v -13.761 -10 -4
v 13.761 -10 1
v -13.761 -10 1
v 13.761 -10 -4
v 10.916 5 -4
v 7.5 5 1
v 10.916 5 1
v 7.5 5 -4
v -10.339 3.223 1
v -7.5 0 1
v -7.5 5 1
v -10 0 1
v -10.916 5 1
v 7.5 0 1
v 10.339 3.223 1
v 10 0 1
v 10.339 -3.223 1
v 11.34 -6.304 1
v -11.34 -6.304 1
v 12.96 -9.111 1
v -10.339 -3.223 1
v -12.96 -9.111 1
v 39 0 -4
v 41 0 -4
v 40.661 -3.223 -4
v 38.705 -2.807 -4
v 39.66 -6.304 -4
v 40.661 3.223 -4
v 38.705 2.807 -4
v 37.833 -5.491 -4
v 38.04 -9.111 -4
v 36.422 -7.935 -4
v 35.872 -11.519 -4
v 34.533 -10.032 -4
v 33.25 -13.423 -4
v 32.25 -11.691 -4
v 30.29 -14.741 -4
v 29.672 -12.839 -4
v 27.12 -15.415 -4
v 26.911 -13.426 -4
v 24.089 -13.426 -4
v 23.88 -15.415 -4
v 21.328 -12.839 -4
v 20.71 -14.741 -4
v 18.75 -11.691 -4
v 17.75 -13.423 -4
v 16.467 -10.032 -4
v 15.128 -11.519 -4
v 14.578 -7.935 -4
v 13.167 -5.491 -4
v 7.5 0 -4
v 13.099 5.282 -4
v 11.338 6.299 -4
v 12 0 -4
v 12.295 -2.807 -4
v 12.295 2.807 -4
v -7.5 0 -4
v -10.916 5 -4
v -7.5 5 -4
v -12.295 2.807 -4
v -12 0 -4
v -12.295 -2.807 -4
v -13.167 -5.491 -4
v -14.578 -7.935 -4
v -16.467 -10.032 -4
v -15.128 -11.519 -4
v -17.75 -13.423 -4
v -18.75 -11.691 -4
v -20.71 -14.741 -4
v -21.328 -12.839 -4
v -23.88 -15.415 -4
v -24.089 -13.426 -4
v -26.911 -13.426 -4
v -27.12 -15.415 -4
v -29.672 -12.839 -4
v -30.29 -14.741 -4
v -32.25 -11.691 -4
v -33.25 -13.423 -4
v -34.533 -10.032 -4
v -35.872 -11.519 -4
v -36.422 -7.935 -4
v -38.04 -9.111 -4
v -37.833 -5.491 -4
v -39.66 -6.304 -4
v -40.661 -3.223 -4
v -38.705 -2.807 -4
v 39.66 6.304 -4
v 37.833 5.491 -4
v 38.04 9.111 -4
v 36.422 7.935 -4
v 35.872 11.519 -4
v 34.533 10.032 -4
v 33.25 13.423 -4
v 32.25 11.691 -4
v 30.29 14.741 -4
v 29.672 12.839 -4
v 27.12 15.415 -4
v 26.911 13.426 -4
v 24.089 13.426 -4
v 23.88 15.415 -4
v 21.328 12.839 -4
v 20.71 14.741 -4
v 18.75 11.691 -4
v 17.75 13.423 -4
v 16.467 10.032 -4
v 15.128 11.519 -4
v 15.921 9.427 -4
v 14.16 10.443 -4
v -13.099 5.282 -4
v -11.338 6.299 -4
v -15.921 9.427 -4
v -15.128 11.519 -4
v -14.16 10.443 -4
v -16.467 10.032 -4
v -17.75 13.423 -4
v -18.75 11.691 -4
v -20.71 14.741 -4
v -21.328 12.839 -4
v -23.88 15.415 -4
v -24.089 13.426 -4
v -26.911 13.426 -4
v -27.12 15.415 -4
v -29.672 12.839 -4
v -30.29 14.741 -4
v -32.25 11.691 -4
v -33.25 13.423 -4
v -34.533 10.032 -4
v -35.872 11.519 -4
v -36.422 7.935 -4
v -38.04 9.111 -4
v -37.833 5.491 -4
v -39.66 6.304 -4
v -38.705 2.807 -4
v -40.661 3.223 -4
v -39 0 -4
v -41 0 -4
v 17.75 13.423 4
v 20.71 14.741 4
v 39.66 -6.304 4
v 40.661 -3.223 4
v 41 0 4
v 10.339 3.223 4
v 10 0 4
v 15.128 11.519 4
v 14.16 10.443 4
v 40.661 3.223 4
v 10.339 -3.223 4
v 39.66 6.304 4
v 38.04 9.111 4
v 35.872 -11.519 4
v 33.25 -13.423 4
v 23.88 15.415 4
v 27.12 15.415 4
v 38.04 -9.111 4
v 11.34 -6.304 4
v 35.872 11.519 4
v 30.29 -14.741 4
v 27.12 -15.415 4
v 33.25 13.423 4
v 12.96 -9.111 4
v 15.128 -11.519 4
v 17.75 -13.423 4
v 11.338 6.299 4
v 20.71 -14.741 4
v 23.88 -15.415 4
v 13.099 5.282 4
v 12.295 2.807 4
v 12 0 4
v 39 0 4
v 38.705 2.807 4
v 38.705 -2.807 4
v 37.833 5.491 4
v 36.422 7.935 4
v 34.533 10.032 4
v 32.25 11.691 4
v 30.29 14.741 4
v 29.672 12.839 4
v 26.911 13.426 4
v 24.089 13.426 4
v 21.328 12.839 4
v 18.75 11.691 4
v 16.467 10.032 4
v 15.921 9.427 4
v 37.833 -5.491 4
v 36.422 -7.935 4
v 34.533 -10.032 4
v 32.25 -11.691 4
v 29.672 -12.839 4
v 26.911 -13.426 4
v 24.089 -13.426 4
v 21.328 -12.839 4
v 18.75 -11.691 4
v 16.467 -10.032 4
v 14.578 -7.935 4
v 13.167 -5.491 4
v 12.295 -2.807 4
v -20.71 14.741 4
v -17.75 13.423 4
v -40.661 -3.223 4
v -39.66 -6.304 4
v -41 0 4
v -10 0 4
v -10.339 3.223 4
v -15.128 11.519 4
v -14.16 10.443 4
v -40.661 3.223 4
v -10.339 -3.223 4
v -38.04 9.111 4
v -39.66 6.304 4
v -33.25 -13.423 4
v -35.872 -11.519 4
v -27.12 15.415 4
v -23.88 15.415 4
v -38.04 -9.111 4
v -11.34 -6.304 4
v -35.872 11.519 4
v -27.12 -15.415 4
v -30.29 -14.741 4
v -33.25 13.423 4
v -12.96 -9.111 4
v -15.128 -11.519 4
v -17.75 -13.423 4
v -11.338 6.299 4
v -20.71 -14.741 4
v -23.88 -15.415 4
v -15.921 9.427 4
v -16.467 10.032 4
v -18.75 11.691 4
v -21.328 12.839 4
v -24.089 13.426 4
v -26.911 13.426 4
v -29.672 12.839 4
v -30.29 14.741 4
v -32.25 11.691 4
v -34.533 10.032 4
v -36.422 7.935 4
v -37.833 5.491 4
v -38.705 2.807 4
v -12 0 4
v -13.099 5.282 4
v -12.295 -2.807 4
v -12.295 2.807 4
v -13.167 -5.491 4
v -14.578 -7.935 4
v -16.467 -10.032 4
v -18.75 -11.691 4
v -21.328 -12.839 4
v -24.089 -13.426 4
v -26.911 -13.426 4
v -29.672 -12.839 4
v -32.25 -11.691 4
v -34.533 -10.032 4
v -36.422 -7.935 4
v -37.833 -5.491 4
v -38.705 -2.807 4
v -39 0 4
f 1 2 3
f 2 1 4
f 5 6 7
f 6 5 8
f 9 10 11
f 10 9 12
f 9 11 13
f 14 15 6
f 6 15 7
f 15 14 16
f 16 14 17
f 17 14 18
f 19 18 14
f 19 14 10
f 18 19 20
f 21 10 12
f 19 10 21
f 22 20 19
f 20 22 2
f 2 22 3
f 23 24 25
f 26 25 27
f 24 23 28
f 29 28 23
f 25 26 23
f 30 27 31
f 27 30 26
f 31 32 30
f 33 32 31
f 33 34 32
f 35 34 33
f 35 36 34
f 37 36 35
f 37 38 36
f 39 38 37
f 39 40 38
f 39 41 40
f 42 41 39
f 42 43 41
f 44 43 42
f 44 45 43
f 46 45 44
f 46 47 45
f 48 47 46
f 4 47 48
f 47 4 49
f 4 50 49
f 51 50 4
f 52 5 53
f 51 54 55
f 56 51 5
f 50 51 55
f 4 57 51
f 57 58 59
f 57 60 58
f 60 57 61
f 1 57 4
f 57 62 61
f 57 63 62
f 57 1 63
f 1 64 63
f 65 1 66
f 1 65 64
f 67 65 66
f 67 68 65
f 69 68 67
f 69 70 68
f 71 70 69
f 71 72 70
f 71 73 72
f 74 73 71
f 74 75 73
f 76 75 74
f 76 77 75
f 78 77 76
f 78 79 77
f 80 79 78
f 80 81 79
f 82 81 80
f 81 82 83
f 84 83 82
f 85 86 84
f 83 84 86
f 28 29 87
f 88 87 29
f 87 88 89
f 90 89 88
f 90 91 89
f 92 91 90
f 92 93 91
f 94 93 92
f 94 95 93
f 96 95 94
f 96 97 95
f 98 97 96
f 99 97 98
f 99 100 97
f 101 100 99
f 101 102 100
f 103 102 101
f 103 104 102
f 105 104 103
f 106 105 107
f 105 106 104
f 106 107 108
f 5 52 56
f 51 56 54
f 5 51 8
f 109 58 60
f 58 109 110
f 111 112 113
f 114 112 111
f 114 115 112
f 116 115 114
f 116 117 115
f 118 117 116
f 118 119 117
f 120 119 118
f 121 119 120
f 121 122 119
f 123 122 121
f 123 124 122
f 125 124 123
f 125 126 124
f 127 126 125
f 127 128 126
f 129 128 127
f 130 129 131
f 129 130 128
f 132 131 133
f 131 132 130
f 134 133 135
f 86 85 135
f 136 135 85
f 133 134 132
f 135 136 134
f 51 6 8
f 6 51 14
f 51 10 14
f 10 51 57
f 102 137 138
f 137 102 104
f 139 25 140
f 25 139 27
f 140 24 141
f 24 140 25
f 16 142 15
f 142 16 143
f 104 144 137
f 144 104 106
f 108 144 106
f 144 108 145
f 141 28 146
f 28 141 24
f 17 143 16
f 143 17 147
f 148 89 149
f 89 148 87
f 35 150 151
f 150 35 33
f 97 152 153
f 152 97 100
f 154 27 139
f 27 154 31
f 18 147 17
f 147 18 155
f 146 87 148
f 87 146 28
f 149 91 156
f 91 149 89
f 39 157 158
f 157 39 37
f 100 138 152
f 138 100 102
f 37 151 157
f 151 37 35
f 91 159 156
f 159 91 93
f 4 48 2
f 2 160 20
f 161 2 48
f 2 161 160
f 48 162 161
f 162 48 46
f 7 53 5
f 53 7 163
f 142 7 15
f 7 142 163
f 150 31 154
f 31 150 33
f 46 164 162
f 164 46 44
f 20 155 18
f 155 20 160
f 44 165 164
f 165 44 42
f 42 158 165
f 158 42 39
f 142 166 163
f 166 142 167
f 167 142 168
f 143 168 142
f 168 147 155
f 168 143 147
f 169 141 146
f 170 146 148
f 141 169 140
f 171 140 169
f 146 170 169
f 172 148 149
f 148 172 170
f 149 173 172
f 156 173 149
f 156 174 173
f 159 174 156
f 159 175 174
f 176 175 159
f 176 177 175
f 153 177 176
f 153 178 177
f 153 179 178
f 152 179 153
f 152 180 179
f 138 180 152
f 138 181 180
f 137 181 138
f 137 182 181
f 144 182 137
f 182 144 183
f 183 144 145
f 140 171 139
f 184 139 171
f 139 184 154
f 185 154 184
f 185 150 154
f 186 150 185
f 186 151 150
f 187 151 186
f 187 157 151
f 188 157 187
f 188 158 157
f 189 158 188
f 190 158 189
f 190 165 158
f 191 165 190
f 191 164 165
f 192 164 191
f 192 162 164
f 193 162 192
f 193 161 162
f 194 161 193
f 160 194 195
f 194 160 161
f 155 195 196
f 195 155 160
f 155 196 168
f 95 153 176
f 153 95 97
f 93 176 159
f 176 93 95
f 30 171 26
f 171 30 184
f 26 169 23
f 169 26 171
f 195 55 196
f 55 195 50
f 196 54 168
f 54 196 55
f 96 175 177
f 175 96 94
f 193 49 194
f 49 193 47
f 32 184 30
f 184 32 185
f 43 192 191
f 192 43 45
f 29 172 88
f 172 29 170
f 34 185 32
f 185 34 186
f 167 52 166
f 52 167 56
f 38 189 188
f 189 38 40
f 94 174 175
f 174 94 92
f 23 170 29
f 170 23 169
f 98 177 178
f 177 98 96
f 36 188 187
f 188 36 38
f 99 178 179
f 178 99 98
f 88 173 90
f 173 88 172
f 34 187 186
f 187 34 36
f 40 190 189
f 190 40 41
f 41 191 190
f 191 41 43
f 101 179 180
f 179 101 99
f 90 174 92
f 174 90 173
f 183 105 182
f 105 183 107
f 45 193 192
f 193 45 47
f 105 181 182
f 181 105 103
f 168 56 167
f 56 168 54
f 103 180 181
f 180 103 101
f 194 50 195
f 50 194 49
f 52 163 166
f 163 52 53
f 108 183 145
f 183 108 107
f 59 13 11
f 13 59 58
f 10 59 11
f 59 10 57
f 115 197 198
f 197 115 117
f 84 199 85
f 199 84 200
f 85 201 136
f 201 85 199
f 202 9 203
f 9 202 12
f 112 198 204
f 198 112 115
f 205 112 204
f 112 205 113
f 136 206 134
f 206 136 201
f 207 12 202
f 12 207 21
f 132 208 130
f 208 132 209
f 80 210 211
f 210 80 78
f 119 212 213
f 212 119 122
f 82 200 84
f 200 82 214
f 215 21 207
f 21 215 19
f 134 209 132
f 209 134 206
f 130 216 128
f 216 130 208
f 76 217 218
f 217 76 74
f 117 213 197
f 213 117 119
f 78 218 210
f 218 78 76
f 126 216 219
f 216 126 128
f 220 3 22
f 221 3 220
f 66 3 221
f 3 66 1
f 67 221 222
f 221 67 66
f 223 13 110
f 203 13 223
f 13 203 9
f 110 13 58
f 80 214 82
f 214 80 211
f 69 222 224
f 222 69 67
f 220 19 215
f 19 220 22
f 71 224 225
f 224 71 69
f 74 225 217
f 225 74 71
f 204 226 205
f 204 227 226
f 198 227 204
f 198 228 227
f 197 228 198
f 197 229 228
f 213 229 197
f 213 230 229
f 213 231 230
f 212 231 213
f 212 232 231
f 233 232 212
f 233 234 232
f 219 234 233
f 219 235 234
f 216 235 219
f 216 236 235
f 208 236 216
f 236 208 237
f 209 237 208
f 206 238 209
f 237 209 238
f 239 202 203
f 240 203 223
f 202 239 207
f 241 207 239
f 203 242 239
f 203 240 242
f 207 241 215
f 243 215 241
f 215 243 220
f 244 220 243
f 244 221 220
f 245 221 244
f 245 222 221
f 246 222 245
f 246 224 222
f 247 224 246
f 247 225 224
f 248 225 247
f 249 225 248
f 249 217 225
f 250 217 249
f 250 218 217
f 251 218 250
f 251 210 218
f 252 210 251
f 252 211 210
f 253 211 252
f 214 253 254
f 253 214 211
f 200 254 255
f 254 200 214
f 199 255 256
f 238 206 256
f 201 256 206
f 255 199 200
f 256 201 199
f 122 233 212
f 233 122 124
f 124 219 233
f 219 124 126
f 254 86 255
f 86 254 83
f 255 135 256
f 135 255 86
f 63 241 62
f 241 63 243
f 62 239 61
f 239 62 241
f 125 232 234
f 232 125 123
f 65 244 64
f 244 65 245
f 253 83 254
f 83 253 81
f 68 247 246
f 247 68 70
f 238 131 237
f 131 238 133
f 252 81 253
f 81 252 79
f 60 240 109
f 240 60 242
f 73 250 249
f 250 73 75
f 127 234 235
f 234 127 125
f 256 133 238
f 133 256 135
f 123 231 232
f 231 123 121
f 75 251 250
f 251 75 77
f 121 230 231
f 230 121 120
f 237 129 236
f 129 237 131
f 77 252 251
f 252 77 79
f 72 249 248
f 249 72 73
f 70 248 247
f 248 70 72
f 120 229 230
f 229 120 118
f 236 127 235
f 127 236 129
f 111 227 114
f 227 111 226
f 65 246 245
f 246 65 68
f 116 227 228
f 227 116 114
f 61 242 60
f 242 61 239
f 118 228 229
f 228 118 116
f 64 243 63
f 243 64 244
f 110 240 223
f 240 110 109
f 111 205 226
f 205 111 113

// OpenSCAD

//width of the rocket pod that needs to fit in the holder. Minimum = 20 mm
width = 27;

module holder_half(w)
{
	difference(){
	union()
	{
	difference()
	{
		translate([0,-4,-5])cube([w,5,15]);
		translate([-1,-4.5,-6])cube([8.5,7,6]);
	}

	translate([w/2+12,4, 0])rotate([90,0,0])cylinder(r=w/2+2, h=8);
	}
	translate([w/2+12,5, 0])rotate([90,0,0])cylinder(r=w/2, h=10);
	translate([8,-5,-14])rotate([0,-30,0])cube([10,10,5]);
	}
}

module holder(w)
{
	holder_half(w);
	mirror([1,0,0])holder_half(w);
}

rotate([90,0,0])holder(width);
